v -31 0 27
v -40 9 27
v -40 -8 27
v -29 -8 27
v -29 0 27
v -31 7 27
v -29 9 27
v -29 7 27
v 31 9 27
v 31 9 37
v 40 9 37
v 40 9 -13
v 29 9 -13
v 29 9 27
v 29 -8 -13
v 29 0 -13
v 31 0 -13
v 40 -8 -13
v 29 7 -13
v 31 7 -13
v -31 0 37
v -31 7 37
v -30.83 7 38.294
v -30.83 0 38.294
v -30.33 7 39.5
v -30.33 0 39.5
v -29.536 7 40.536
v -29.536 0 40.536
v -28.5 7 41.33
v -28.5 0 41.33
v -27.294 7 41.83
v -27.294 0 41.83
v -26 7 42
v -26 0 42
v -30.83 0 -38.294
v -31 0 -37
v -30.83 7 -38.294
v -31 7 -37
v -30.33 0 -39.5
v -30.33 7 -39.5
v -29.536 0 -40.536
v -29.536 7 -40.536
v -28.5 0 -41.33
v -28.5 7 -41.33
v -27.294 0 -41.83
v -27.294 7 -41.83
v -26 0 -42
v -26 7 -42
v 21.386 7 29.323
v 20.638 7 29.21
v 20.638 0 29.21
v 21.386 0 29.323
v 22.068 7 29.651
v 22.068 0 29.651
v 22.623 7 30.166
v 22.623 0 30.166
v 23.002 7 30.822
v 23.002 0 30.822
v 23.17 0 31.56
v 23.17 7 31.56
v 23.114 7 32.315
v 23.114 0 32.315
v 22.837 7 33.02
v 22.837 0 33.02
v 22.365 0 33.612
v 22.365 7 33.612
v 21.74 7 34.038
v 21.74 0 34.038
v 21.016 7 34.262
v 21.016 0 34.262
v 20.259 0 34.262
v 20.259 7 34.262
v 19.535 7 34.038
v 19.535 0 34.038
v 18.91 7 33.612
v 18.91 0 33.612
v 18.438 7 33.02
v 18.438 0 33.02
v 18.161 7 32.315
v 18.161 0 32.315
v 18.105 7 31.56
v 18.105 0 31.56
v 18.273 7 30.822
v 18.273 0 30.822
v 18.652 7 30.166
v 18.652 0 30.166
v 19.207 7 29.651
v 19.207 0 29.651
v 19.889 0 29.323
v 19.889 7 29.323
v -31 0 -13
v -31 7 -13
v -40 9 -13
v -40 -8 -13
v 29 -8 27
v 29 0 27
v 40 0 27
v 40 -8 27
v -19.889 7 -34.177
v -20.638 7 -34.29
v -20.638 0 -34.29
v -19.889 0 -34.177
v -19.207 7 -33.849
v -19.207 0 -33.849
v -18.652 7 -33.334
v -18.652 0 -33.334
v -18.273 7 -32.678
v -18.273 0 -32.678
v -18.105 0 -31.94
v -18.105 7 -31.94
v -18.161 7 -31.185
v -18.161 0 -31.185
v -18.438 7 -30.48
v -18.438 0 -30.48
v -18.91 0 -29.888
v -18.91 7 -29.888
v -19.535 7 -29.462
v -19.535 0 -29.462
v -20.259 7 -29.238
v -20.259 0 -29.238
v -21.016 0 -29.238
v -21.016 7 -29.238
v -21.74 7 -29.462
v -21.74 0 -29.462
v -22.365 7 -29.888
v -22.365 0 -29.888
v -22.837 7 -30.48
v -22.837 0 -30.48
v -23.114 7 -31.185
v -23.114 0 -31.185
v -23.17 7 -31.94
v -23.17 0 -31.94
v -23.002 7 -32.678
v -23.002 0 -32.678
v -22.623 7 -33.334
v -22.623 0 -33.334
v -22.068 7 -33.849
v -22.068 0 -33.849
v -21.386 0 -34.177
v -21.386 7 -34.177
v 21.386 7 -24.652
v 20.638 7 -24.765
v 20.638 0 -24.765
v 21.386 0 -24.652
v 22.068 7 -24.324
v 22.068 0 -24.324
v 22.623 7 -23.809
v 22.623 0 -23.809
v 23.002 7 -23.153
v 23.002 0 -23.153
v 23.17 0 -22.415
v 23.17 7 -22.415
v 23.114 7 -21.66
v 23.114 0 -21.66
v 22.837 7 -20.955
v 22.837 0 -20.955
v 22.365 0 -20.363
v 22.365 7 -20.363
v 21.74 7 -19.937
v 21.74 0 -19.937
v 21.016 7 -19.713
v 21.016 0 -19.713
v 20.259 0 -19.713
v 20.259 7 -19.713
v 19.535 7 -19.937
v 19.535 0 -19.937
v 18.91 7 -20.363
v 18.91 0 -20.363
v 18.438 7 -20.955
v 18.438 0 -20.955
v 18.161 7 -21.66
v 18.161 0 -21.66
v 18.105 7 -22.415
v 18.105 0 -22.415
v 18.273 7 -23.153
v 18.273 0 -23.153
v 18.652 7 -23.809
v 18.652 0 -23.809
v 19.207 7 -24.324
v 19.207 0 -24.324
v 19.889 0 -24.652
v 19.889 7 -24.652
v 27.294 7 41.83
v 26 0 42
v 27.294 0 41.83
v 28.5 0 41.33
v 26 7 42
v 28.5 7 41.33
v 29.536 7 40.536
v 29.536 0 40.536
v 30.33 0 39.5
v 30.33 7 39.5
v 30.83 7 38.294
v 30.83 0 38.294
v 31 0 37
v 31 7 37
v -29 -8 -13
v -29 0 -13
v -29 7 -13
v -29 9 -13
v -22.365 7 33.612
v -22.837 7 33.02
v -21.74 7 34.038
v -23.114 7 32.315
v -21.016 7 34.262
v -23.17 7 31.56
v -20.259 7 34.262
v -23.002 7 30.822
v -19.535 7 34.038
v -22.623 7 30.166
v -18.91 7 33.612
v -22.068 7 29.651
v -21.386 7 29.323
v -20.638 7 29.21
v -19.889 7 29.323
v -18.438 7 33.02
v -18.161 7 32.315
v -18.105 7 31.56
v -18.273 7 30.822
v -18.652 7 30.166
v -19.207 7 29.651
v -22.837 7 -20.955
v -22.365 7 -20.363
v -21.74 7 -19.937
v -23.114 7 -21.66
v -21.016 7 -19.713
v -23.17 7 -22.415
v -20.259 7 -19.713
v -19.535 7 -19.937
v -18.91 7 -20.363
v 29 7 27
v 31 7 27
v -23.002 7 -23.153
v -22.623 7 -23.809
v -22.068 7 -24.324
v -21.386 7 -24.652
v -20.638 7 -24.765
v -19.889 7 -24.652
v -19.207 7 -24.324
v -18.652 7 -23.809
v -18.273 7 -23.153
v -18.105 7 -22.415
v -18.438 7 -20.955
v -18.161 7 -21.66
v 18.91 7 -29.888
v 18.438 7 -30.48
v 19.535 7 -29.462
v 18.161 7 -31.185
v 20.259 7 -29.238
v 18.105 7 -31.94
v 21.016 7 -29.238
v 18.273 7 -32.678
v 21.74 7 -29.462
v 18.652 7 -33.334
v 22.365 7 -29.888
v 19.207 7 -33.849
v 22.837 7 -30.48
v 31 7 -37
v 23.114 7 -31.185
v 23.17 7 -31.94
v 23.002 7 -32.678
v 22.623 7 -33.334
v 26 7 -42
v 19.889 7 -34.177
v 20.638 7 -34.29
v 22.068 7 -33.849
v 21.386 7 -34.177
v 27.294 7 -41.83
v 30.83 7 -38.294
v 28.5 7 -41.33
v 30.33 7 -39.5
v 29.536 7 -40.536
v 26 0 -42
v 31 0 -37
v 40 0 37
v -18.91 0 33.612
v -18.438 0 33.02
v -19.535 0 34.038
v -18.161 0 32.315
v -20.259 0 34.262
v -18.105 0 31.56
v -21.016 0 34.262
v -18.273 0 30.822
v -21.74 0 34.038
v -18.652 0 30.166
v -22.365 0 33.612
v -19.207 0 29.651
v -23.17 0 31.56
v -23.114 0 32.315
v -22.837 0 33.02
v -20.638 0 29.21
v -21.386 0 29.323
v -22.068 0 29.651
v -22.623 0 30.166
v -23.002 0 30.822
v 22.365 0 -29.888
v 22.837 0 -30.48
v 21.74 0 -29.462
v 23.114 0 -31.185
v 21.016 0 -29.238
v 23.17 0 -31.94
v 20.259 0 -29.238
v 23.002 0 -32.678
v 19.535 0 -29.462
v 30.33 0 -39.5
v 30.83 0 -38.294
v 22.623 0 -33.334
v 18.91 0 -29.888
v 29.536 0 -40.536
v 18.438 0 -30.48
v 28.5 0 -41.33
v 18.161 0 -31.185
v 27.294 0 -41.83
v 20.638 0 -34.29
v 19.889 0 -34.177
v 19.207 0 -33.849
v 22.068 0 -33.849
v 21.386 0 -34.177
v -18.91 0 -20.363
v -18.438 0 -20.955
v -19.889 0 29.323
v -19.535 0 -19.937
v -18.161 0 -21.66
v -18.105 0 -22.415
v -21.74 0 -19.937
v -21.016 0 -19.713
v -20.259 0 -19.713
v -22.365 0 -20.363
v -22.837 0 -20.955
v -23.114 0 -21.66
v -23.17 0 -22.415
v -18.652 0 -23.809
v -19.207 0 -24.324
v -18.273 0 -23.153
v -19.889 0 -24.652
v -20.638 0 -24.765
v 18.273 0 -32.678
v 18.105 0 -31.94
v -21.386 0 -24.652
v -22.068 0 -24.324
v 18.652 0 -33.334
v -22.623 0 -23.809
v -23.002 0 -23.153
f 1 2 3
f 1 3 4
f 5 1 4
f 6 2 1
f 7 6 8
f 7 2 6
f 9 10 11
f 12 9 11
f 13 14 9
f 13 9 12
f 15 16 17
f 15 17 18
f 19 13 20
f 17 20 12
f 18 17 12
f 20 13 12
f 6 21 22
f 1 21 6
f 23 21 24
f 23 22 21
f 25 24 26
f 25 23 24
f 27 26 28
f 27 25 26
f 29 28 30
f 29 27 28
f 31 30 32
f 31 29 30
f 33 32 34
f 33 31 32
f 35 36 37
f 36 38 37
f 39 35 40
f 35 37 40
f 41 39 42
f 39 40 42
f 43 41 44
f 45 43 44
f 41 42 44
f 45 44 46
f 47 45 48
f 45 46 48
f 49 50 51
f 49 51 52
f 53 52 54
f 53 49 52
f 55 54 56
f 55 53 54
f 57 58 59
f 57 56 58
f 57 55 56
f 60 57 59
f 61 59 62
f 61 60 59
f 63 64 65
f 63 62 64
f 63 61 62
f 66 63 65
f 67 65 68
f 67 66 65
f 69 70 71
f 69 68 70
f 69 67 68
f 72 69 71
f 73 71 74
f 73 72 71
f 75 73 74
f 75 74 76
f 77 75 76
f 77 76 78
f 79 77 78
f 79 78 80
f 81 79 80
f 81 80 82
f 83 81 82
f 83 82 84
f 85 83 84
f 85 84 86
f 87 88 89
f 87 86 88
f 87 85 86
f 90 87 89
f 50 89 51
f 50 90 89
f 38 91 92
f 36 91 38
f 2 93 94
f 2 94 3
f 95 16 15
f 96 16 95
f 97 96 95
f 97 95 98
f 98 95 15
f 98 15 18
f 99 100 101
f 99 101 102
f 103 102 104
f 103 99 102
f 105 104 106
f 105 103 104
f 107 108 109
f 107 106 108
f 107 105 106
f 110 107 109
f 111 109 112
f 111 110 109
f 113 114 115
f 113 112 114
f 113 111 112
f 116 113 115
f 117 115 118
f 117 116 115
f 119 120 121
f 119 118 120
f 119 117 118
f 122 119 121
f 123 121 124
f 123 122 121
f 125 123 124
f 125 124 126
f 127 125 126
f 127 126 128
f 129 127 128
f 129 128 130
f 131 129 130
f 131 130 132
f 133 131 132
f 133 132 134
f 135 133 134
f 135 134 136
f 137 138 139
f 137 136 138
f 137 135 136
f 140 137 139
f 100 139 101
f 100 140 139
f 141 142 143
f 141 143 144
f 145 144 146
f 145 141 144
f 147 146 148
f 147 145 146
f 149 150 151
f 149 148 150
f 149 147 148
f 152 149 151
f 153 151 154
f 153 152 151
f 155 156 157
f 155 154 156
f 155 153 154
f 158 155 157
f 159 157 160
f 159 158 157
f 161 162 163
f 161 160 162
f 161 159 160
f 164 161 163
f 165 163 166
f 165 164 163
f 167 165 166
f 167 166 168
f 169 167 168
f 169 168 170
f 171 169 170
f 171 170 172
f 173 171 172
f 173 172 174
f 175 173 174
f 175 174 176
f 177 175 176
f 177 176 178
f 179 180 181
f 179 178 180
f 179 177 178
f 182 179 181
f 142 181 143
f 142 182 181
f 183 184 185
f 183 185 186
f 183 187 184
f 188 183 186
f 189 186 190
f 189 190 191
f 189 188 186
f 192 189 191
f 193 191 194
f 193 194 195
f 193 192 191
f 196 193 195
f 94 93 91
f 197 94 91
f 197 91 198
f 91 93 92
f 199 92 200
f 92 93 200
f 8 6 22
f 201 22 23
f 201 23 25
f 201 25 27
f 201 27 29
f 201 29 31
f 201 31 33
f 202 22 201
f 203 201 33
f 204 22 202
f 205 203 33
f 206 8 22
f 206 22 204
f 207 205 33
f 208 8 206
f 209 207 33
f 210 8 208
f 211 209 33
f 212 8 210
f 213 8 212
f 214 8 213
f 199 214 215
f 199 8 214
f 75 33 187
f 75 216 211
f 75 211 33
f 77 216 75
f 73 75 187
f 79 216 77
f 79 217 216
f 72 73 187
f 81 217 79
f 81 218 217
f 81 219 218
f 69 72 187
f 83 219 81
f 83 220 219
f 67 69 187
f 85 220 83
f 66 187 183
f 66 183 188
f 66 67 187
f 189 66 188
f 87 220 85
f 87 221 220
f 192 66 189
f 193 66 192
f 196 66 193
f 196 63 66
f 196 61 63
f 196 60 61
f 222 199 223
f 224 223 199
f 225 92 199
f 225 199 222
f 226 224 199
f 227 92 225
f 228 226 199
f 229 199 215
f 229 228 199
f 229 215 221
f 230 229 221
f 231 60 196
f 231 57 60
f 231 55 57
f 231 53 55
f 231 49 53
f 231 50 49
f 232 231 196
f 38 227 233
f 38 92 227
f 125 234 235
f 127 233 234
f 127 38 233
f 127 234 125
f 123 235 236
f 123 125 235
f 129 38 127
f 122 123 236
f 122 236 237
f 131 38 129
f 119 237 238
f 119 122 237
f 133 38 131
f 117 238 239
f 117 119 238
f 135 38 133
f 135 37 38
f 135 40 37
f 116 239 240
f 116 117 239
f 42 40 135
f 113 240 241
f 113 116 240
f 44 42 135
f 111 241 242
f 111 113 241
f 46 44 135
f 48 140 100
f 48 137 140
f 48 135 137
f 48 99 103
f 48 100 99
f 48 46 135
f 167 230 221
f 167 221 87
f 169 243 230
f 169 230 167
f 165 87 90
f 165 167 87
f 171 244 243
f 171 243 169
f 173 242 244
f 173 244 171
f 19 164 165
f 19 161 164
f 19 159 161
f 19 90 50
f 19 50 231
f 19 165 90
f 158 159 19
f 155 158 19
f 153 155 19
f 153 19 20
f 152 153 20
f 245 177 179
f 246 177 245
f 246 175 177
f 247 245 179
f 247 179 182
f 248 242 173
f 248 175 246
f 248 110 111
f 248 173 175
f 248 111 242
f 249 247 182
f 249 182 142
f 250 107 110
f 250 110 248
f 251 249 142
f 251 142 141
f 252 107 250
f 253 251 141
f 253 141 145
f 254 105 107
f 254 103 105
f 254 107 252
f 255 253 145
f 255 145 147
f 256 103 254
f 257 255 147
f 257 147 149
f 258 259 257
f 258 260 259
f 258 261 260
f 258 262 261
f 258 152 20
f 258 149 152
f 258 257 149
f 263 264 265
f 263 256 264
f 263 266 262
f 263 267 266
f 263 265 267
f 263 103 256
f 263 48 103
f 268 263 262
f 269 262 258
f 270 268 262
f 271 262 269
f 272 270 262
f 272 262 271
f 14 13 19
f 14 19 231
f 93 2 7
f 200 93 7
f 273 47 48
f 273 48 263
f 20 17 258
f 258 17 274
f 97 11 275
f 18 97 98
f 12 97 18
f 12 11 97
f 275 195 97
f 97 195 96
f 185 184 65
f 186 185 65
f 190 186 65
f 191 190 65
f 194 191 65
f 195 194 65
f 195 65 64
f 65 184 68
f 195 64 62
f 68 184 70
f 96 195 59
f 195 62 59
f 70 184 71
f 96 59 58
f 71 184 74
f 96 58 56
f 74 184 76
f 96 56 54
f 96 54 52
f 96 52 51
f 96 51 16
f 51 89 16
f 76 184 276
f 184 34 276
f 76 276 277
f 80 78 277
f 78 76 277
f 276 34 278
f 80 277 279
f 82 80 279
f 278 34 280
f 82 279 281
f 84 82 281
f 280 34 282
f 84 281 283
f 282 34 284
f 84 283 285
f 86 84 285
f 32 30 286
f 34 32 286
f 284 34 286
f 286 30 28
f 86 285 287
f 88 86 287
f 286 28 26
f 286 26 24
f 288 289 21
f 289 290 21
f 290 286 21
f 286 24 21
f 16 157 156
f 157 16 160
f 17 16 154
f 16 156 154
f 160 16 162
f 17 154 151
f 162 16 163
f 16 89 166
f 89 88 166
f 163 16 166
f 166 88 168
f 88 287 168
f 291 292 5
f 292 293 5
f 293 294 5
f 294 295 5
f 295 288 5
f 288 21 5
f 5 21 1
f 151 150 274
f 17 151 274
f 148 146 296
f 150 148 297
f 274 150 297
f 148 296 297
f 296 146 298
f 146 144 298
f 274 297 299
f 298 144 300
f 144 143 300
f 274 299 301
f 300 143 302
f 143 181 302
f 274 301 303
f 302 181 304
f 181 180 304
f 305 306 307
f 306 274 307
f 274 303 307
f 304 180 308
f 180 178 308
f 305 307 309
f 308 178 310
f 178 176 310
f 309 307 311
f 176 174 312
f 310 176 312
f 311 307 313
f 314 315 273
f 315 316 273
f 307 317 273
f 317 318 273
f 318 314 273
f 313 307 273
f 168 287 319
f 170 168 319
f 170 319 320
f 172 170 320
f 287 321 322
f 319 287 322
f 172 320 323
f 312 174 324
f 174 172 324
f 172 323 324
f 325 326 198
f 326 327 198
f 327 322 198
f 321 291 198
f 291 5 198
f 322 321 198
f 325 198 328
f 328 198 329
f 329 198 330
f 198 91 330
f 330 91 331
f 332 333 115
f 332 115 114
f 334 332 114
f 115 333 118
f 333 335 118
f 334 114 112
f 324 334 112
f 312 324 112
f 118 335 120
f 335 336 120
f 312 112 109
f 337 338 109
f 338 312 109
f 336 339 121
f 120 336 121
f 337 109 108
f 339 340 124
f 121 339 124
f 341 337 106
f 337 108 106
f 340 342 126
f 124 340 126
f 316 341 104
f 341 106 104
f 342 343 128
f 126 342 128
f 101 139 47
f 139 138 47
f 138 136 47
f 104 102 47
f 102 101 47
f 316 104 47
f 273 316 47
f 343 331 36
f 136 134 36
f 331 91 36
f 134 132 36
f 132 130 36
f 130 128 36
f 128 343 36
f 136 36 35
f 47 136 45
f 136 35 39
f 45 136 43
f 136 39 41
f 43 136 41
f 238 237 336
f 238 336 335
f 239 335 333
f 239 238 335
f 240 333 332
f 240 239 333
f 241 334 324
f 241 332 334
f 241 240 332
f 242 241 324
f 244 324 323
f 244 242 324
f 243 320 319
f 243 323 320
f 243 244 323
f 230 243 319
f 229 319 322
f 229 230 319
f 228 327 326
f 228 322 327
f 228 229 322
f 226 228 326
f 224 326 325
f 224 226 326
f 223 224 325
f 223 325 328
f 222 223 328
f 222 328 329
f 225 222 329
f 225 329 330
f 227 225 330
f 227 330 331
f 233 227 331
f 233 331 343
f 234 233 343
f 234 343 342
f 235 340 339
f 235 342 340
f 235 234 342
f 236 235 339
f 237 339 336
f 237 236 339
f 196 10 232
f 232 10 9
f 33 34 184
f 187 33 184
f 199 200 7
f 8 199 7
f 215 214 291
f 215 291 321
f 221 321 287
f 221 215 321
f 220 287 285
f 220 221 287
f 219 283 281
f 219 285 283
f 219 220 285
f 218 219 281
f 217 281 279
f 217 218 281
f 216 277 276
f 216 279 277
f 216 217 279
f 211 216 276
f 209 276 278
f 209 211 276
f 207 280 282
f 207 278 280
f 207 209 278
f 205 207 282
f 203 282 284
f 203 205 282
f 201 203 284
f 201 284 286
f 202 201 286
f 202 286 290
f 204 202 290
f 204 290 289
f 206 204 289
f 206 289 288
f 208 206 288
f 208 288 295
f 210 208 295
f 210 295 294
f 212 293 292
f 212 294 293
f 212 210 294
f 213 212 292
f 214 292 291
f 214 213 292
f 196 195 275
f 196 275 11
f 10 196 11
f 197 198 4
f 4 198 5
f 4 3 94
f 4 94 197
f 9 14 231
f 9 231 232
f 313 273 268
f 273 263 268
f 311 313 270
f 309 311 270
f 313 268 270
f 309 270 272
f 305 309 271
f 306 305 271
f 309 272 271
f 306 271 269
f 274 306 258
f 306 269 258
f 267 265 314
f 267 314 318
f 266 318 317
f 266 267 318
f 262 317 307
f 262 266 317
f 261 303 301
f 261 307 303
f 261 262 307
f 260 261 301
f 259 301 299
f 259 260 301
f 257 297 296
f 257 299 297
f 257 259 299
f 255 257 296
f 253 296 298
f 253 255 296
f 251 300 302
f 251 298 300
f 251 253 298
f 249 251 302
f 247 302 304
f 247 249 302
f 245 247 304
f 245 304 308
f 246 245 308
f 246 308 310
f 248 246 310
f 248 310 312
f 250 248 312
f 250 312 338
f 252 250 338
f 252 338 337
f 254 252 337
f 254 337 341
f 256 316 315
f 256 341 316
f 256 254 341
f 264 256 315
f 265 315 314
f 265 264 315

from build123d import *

# Parameters (mm, degrees)
SKETCH_2_W               = 62
SKETCH_2_H               = 84
EXTRUDE_1_DEPTH          = 7
CUT_EXTRUDE_1_DEPTH      = 53.668776329
CUT_EXTRUDE_1_DEPTH_BACK = 53.668776329
SKETCH_4_R               = 2.54
FILLET_1_R               = 5
FILLET_4_R               = 5
EXTRUDE_2_DEPTH          = 8
EXTRUDE_2_DEPTH_BACK     = 9
SKETCH_5_W               = 11
SKETCH_5_H               = 40
SKETCH_11_W              = 10
SKETCH_11_H              = 9
EXTRUDE_3_DEPTH          = 9


with BuildPart() as part:
    # 스케치2 → 보스-돌출1 (new body)
    with BuildSketch(Plane(origin=(0, 0, 0), x_dir=(1, 0, 0), z_dir=(0, 1, 0))):
        Rectangle(SKETCH_2_W, SKETCH_2_H)
    extrude(amount=EXTRUDE_1_DEPTH)

    # 스케치4 → 컷-돌출1 (cut, two sides: drawn at the far end of the back side and taken through both)
    with BuildSketch(Plane.XZ.offset(-CUT_EXTRUDE_1_DEPTH_BACK)):
        with Locations(Location((20.6375, 31.75, 0), (0, 0, 270))):
            Circle(SKETCH_4_R)
        with Locations(Location((20.6375, -22.225, 0), (0, 0, 270))):
            Circle(SKETCH_4_R)
        with Locations(Location((20.6375, -31.75, 0), (0, 0, 270))):
            Circle(SKETCH_4_R)
        with Locations(Location((-20.6375, -31.75, 0), (0, 0, 270))):
            Circle(SKETCH_4_R)
        with Locations(Location((-20.6375, -22.225, 0), (0, 0, 270))):
            Circle(SKETCH_4_R)
        with Locations(Location((-20.6375, 31.75, 0), (0, 0, 270))):
            Circle(SKETCH_4_R)
    extrude(amount=CUT_EXTRUDE_1_DEPTH + CUT_EXTRUDE_1_DEPTH_BACK, mode=Mode.SUBTRACT)

    # 필렛1
    fillet_1_edges = [part.edges().sort_by_distance(p)[0] for p in [
        (-31, 3.5, -42),
        (31, 3.5, -42),
    ]]
    fillet(fillet_1_edges, radius=FILLET_1_R)

    # 필렛4
    fillet_4_edges = [part.edges().sort_by_distance(p)[0] for p in [
        (31, 3.5, 42),
        (-31, 3.5, 42),
    ]]
    fillet(fillet_4_edges, radius=FILLET_4_R)

    # 스케치5 → 보스-돌출2 (add, two sides: drawn at the far end of the back side and taken through both)
    with BuildSketch(Plane.XZ.offset(-EXTRUDE_2_DEPTH_BACK)):
        with Locations((-34.5, 7)):
            Rectangle(SKETCH_5_W, SKETCH_5_H)
        with Locations((34.5, 7)):
            Rectangle(SKETCH_5_W, SKETCH_5_H)
    extrude(amount=EXTRUDE_2_DEPTH + EXTRUDE_2_DEPTH_BACK)

    # 스케치11 → 보스-돌출3 (add)
    with BuildSketch(Plane(origin=(31, 0, 0), x_dir=(0, 0, -1), z_dir=(1, 0, 0))):
        with Locations((-32, 4.5)):
            Rectangle(SKETCH_11_W, SKETCH_11_H)
    extrude(amount=EXTRUDE_3_DEPTH)


solid = part.part
